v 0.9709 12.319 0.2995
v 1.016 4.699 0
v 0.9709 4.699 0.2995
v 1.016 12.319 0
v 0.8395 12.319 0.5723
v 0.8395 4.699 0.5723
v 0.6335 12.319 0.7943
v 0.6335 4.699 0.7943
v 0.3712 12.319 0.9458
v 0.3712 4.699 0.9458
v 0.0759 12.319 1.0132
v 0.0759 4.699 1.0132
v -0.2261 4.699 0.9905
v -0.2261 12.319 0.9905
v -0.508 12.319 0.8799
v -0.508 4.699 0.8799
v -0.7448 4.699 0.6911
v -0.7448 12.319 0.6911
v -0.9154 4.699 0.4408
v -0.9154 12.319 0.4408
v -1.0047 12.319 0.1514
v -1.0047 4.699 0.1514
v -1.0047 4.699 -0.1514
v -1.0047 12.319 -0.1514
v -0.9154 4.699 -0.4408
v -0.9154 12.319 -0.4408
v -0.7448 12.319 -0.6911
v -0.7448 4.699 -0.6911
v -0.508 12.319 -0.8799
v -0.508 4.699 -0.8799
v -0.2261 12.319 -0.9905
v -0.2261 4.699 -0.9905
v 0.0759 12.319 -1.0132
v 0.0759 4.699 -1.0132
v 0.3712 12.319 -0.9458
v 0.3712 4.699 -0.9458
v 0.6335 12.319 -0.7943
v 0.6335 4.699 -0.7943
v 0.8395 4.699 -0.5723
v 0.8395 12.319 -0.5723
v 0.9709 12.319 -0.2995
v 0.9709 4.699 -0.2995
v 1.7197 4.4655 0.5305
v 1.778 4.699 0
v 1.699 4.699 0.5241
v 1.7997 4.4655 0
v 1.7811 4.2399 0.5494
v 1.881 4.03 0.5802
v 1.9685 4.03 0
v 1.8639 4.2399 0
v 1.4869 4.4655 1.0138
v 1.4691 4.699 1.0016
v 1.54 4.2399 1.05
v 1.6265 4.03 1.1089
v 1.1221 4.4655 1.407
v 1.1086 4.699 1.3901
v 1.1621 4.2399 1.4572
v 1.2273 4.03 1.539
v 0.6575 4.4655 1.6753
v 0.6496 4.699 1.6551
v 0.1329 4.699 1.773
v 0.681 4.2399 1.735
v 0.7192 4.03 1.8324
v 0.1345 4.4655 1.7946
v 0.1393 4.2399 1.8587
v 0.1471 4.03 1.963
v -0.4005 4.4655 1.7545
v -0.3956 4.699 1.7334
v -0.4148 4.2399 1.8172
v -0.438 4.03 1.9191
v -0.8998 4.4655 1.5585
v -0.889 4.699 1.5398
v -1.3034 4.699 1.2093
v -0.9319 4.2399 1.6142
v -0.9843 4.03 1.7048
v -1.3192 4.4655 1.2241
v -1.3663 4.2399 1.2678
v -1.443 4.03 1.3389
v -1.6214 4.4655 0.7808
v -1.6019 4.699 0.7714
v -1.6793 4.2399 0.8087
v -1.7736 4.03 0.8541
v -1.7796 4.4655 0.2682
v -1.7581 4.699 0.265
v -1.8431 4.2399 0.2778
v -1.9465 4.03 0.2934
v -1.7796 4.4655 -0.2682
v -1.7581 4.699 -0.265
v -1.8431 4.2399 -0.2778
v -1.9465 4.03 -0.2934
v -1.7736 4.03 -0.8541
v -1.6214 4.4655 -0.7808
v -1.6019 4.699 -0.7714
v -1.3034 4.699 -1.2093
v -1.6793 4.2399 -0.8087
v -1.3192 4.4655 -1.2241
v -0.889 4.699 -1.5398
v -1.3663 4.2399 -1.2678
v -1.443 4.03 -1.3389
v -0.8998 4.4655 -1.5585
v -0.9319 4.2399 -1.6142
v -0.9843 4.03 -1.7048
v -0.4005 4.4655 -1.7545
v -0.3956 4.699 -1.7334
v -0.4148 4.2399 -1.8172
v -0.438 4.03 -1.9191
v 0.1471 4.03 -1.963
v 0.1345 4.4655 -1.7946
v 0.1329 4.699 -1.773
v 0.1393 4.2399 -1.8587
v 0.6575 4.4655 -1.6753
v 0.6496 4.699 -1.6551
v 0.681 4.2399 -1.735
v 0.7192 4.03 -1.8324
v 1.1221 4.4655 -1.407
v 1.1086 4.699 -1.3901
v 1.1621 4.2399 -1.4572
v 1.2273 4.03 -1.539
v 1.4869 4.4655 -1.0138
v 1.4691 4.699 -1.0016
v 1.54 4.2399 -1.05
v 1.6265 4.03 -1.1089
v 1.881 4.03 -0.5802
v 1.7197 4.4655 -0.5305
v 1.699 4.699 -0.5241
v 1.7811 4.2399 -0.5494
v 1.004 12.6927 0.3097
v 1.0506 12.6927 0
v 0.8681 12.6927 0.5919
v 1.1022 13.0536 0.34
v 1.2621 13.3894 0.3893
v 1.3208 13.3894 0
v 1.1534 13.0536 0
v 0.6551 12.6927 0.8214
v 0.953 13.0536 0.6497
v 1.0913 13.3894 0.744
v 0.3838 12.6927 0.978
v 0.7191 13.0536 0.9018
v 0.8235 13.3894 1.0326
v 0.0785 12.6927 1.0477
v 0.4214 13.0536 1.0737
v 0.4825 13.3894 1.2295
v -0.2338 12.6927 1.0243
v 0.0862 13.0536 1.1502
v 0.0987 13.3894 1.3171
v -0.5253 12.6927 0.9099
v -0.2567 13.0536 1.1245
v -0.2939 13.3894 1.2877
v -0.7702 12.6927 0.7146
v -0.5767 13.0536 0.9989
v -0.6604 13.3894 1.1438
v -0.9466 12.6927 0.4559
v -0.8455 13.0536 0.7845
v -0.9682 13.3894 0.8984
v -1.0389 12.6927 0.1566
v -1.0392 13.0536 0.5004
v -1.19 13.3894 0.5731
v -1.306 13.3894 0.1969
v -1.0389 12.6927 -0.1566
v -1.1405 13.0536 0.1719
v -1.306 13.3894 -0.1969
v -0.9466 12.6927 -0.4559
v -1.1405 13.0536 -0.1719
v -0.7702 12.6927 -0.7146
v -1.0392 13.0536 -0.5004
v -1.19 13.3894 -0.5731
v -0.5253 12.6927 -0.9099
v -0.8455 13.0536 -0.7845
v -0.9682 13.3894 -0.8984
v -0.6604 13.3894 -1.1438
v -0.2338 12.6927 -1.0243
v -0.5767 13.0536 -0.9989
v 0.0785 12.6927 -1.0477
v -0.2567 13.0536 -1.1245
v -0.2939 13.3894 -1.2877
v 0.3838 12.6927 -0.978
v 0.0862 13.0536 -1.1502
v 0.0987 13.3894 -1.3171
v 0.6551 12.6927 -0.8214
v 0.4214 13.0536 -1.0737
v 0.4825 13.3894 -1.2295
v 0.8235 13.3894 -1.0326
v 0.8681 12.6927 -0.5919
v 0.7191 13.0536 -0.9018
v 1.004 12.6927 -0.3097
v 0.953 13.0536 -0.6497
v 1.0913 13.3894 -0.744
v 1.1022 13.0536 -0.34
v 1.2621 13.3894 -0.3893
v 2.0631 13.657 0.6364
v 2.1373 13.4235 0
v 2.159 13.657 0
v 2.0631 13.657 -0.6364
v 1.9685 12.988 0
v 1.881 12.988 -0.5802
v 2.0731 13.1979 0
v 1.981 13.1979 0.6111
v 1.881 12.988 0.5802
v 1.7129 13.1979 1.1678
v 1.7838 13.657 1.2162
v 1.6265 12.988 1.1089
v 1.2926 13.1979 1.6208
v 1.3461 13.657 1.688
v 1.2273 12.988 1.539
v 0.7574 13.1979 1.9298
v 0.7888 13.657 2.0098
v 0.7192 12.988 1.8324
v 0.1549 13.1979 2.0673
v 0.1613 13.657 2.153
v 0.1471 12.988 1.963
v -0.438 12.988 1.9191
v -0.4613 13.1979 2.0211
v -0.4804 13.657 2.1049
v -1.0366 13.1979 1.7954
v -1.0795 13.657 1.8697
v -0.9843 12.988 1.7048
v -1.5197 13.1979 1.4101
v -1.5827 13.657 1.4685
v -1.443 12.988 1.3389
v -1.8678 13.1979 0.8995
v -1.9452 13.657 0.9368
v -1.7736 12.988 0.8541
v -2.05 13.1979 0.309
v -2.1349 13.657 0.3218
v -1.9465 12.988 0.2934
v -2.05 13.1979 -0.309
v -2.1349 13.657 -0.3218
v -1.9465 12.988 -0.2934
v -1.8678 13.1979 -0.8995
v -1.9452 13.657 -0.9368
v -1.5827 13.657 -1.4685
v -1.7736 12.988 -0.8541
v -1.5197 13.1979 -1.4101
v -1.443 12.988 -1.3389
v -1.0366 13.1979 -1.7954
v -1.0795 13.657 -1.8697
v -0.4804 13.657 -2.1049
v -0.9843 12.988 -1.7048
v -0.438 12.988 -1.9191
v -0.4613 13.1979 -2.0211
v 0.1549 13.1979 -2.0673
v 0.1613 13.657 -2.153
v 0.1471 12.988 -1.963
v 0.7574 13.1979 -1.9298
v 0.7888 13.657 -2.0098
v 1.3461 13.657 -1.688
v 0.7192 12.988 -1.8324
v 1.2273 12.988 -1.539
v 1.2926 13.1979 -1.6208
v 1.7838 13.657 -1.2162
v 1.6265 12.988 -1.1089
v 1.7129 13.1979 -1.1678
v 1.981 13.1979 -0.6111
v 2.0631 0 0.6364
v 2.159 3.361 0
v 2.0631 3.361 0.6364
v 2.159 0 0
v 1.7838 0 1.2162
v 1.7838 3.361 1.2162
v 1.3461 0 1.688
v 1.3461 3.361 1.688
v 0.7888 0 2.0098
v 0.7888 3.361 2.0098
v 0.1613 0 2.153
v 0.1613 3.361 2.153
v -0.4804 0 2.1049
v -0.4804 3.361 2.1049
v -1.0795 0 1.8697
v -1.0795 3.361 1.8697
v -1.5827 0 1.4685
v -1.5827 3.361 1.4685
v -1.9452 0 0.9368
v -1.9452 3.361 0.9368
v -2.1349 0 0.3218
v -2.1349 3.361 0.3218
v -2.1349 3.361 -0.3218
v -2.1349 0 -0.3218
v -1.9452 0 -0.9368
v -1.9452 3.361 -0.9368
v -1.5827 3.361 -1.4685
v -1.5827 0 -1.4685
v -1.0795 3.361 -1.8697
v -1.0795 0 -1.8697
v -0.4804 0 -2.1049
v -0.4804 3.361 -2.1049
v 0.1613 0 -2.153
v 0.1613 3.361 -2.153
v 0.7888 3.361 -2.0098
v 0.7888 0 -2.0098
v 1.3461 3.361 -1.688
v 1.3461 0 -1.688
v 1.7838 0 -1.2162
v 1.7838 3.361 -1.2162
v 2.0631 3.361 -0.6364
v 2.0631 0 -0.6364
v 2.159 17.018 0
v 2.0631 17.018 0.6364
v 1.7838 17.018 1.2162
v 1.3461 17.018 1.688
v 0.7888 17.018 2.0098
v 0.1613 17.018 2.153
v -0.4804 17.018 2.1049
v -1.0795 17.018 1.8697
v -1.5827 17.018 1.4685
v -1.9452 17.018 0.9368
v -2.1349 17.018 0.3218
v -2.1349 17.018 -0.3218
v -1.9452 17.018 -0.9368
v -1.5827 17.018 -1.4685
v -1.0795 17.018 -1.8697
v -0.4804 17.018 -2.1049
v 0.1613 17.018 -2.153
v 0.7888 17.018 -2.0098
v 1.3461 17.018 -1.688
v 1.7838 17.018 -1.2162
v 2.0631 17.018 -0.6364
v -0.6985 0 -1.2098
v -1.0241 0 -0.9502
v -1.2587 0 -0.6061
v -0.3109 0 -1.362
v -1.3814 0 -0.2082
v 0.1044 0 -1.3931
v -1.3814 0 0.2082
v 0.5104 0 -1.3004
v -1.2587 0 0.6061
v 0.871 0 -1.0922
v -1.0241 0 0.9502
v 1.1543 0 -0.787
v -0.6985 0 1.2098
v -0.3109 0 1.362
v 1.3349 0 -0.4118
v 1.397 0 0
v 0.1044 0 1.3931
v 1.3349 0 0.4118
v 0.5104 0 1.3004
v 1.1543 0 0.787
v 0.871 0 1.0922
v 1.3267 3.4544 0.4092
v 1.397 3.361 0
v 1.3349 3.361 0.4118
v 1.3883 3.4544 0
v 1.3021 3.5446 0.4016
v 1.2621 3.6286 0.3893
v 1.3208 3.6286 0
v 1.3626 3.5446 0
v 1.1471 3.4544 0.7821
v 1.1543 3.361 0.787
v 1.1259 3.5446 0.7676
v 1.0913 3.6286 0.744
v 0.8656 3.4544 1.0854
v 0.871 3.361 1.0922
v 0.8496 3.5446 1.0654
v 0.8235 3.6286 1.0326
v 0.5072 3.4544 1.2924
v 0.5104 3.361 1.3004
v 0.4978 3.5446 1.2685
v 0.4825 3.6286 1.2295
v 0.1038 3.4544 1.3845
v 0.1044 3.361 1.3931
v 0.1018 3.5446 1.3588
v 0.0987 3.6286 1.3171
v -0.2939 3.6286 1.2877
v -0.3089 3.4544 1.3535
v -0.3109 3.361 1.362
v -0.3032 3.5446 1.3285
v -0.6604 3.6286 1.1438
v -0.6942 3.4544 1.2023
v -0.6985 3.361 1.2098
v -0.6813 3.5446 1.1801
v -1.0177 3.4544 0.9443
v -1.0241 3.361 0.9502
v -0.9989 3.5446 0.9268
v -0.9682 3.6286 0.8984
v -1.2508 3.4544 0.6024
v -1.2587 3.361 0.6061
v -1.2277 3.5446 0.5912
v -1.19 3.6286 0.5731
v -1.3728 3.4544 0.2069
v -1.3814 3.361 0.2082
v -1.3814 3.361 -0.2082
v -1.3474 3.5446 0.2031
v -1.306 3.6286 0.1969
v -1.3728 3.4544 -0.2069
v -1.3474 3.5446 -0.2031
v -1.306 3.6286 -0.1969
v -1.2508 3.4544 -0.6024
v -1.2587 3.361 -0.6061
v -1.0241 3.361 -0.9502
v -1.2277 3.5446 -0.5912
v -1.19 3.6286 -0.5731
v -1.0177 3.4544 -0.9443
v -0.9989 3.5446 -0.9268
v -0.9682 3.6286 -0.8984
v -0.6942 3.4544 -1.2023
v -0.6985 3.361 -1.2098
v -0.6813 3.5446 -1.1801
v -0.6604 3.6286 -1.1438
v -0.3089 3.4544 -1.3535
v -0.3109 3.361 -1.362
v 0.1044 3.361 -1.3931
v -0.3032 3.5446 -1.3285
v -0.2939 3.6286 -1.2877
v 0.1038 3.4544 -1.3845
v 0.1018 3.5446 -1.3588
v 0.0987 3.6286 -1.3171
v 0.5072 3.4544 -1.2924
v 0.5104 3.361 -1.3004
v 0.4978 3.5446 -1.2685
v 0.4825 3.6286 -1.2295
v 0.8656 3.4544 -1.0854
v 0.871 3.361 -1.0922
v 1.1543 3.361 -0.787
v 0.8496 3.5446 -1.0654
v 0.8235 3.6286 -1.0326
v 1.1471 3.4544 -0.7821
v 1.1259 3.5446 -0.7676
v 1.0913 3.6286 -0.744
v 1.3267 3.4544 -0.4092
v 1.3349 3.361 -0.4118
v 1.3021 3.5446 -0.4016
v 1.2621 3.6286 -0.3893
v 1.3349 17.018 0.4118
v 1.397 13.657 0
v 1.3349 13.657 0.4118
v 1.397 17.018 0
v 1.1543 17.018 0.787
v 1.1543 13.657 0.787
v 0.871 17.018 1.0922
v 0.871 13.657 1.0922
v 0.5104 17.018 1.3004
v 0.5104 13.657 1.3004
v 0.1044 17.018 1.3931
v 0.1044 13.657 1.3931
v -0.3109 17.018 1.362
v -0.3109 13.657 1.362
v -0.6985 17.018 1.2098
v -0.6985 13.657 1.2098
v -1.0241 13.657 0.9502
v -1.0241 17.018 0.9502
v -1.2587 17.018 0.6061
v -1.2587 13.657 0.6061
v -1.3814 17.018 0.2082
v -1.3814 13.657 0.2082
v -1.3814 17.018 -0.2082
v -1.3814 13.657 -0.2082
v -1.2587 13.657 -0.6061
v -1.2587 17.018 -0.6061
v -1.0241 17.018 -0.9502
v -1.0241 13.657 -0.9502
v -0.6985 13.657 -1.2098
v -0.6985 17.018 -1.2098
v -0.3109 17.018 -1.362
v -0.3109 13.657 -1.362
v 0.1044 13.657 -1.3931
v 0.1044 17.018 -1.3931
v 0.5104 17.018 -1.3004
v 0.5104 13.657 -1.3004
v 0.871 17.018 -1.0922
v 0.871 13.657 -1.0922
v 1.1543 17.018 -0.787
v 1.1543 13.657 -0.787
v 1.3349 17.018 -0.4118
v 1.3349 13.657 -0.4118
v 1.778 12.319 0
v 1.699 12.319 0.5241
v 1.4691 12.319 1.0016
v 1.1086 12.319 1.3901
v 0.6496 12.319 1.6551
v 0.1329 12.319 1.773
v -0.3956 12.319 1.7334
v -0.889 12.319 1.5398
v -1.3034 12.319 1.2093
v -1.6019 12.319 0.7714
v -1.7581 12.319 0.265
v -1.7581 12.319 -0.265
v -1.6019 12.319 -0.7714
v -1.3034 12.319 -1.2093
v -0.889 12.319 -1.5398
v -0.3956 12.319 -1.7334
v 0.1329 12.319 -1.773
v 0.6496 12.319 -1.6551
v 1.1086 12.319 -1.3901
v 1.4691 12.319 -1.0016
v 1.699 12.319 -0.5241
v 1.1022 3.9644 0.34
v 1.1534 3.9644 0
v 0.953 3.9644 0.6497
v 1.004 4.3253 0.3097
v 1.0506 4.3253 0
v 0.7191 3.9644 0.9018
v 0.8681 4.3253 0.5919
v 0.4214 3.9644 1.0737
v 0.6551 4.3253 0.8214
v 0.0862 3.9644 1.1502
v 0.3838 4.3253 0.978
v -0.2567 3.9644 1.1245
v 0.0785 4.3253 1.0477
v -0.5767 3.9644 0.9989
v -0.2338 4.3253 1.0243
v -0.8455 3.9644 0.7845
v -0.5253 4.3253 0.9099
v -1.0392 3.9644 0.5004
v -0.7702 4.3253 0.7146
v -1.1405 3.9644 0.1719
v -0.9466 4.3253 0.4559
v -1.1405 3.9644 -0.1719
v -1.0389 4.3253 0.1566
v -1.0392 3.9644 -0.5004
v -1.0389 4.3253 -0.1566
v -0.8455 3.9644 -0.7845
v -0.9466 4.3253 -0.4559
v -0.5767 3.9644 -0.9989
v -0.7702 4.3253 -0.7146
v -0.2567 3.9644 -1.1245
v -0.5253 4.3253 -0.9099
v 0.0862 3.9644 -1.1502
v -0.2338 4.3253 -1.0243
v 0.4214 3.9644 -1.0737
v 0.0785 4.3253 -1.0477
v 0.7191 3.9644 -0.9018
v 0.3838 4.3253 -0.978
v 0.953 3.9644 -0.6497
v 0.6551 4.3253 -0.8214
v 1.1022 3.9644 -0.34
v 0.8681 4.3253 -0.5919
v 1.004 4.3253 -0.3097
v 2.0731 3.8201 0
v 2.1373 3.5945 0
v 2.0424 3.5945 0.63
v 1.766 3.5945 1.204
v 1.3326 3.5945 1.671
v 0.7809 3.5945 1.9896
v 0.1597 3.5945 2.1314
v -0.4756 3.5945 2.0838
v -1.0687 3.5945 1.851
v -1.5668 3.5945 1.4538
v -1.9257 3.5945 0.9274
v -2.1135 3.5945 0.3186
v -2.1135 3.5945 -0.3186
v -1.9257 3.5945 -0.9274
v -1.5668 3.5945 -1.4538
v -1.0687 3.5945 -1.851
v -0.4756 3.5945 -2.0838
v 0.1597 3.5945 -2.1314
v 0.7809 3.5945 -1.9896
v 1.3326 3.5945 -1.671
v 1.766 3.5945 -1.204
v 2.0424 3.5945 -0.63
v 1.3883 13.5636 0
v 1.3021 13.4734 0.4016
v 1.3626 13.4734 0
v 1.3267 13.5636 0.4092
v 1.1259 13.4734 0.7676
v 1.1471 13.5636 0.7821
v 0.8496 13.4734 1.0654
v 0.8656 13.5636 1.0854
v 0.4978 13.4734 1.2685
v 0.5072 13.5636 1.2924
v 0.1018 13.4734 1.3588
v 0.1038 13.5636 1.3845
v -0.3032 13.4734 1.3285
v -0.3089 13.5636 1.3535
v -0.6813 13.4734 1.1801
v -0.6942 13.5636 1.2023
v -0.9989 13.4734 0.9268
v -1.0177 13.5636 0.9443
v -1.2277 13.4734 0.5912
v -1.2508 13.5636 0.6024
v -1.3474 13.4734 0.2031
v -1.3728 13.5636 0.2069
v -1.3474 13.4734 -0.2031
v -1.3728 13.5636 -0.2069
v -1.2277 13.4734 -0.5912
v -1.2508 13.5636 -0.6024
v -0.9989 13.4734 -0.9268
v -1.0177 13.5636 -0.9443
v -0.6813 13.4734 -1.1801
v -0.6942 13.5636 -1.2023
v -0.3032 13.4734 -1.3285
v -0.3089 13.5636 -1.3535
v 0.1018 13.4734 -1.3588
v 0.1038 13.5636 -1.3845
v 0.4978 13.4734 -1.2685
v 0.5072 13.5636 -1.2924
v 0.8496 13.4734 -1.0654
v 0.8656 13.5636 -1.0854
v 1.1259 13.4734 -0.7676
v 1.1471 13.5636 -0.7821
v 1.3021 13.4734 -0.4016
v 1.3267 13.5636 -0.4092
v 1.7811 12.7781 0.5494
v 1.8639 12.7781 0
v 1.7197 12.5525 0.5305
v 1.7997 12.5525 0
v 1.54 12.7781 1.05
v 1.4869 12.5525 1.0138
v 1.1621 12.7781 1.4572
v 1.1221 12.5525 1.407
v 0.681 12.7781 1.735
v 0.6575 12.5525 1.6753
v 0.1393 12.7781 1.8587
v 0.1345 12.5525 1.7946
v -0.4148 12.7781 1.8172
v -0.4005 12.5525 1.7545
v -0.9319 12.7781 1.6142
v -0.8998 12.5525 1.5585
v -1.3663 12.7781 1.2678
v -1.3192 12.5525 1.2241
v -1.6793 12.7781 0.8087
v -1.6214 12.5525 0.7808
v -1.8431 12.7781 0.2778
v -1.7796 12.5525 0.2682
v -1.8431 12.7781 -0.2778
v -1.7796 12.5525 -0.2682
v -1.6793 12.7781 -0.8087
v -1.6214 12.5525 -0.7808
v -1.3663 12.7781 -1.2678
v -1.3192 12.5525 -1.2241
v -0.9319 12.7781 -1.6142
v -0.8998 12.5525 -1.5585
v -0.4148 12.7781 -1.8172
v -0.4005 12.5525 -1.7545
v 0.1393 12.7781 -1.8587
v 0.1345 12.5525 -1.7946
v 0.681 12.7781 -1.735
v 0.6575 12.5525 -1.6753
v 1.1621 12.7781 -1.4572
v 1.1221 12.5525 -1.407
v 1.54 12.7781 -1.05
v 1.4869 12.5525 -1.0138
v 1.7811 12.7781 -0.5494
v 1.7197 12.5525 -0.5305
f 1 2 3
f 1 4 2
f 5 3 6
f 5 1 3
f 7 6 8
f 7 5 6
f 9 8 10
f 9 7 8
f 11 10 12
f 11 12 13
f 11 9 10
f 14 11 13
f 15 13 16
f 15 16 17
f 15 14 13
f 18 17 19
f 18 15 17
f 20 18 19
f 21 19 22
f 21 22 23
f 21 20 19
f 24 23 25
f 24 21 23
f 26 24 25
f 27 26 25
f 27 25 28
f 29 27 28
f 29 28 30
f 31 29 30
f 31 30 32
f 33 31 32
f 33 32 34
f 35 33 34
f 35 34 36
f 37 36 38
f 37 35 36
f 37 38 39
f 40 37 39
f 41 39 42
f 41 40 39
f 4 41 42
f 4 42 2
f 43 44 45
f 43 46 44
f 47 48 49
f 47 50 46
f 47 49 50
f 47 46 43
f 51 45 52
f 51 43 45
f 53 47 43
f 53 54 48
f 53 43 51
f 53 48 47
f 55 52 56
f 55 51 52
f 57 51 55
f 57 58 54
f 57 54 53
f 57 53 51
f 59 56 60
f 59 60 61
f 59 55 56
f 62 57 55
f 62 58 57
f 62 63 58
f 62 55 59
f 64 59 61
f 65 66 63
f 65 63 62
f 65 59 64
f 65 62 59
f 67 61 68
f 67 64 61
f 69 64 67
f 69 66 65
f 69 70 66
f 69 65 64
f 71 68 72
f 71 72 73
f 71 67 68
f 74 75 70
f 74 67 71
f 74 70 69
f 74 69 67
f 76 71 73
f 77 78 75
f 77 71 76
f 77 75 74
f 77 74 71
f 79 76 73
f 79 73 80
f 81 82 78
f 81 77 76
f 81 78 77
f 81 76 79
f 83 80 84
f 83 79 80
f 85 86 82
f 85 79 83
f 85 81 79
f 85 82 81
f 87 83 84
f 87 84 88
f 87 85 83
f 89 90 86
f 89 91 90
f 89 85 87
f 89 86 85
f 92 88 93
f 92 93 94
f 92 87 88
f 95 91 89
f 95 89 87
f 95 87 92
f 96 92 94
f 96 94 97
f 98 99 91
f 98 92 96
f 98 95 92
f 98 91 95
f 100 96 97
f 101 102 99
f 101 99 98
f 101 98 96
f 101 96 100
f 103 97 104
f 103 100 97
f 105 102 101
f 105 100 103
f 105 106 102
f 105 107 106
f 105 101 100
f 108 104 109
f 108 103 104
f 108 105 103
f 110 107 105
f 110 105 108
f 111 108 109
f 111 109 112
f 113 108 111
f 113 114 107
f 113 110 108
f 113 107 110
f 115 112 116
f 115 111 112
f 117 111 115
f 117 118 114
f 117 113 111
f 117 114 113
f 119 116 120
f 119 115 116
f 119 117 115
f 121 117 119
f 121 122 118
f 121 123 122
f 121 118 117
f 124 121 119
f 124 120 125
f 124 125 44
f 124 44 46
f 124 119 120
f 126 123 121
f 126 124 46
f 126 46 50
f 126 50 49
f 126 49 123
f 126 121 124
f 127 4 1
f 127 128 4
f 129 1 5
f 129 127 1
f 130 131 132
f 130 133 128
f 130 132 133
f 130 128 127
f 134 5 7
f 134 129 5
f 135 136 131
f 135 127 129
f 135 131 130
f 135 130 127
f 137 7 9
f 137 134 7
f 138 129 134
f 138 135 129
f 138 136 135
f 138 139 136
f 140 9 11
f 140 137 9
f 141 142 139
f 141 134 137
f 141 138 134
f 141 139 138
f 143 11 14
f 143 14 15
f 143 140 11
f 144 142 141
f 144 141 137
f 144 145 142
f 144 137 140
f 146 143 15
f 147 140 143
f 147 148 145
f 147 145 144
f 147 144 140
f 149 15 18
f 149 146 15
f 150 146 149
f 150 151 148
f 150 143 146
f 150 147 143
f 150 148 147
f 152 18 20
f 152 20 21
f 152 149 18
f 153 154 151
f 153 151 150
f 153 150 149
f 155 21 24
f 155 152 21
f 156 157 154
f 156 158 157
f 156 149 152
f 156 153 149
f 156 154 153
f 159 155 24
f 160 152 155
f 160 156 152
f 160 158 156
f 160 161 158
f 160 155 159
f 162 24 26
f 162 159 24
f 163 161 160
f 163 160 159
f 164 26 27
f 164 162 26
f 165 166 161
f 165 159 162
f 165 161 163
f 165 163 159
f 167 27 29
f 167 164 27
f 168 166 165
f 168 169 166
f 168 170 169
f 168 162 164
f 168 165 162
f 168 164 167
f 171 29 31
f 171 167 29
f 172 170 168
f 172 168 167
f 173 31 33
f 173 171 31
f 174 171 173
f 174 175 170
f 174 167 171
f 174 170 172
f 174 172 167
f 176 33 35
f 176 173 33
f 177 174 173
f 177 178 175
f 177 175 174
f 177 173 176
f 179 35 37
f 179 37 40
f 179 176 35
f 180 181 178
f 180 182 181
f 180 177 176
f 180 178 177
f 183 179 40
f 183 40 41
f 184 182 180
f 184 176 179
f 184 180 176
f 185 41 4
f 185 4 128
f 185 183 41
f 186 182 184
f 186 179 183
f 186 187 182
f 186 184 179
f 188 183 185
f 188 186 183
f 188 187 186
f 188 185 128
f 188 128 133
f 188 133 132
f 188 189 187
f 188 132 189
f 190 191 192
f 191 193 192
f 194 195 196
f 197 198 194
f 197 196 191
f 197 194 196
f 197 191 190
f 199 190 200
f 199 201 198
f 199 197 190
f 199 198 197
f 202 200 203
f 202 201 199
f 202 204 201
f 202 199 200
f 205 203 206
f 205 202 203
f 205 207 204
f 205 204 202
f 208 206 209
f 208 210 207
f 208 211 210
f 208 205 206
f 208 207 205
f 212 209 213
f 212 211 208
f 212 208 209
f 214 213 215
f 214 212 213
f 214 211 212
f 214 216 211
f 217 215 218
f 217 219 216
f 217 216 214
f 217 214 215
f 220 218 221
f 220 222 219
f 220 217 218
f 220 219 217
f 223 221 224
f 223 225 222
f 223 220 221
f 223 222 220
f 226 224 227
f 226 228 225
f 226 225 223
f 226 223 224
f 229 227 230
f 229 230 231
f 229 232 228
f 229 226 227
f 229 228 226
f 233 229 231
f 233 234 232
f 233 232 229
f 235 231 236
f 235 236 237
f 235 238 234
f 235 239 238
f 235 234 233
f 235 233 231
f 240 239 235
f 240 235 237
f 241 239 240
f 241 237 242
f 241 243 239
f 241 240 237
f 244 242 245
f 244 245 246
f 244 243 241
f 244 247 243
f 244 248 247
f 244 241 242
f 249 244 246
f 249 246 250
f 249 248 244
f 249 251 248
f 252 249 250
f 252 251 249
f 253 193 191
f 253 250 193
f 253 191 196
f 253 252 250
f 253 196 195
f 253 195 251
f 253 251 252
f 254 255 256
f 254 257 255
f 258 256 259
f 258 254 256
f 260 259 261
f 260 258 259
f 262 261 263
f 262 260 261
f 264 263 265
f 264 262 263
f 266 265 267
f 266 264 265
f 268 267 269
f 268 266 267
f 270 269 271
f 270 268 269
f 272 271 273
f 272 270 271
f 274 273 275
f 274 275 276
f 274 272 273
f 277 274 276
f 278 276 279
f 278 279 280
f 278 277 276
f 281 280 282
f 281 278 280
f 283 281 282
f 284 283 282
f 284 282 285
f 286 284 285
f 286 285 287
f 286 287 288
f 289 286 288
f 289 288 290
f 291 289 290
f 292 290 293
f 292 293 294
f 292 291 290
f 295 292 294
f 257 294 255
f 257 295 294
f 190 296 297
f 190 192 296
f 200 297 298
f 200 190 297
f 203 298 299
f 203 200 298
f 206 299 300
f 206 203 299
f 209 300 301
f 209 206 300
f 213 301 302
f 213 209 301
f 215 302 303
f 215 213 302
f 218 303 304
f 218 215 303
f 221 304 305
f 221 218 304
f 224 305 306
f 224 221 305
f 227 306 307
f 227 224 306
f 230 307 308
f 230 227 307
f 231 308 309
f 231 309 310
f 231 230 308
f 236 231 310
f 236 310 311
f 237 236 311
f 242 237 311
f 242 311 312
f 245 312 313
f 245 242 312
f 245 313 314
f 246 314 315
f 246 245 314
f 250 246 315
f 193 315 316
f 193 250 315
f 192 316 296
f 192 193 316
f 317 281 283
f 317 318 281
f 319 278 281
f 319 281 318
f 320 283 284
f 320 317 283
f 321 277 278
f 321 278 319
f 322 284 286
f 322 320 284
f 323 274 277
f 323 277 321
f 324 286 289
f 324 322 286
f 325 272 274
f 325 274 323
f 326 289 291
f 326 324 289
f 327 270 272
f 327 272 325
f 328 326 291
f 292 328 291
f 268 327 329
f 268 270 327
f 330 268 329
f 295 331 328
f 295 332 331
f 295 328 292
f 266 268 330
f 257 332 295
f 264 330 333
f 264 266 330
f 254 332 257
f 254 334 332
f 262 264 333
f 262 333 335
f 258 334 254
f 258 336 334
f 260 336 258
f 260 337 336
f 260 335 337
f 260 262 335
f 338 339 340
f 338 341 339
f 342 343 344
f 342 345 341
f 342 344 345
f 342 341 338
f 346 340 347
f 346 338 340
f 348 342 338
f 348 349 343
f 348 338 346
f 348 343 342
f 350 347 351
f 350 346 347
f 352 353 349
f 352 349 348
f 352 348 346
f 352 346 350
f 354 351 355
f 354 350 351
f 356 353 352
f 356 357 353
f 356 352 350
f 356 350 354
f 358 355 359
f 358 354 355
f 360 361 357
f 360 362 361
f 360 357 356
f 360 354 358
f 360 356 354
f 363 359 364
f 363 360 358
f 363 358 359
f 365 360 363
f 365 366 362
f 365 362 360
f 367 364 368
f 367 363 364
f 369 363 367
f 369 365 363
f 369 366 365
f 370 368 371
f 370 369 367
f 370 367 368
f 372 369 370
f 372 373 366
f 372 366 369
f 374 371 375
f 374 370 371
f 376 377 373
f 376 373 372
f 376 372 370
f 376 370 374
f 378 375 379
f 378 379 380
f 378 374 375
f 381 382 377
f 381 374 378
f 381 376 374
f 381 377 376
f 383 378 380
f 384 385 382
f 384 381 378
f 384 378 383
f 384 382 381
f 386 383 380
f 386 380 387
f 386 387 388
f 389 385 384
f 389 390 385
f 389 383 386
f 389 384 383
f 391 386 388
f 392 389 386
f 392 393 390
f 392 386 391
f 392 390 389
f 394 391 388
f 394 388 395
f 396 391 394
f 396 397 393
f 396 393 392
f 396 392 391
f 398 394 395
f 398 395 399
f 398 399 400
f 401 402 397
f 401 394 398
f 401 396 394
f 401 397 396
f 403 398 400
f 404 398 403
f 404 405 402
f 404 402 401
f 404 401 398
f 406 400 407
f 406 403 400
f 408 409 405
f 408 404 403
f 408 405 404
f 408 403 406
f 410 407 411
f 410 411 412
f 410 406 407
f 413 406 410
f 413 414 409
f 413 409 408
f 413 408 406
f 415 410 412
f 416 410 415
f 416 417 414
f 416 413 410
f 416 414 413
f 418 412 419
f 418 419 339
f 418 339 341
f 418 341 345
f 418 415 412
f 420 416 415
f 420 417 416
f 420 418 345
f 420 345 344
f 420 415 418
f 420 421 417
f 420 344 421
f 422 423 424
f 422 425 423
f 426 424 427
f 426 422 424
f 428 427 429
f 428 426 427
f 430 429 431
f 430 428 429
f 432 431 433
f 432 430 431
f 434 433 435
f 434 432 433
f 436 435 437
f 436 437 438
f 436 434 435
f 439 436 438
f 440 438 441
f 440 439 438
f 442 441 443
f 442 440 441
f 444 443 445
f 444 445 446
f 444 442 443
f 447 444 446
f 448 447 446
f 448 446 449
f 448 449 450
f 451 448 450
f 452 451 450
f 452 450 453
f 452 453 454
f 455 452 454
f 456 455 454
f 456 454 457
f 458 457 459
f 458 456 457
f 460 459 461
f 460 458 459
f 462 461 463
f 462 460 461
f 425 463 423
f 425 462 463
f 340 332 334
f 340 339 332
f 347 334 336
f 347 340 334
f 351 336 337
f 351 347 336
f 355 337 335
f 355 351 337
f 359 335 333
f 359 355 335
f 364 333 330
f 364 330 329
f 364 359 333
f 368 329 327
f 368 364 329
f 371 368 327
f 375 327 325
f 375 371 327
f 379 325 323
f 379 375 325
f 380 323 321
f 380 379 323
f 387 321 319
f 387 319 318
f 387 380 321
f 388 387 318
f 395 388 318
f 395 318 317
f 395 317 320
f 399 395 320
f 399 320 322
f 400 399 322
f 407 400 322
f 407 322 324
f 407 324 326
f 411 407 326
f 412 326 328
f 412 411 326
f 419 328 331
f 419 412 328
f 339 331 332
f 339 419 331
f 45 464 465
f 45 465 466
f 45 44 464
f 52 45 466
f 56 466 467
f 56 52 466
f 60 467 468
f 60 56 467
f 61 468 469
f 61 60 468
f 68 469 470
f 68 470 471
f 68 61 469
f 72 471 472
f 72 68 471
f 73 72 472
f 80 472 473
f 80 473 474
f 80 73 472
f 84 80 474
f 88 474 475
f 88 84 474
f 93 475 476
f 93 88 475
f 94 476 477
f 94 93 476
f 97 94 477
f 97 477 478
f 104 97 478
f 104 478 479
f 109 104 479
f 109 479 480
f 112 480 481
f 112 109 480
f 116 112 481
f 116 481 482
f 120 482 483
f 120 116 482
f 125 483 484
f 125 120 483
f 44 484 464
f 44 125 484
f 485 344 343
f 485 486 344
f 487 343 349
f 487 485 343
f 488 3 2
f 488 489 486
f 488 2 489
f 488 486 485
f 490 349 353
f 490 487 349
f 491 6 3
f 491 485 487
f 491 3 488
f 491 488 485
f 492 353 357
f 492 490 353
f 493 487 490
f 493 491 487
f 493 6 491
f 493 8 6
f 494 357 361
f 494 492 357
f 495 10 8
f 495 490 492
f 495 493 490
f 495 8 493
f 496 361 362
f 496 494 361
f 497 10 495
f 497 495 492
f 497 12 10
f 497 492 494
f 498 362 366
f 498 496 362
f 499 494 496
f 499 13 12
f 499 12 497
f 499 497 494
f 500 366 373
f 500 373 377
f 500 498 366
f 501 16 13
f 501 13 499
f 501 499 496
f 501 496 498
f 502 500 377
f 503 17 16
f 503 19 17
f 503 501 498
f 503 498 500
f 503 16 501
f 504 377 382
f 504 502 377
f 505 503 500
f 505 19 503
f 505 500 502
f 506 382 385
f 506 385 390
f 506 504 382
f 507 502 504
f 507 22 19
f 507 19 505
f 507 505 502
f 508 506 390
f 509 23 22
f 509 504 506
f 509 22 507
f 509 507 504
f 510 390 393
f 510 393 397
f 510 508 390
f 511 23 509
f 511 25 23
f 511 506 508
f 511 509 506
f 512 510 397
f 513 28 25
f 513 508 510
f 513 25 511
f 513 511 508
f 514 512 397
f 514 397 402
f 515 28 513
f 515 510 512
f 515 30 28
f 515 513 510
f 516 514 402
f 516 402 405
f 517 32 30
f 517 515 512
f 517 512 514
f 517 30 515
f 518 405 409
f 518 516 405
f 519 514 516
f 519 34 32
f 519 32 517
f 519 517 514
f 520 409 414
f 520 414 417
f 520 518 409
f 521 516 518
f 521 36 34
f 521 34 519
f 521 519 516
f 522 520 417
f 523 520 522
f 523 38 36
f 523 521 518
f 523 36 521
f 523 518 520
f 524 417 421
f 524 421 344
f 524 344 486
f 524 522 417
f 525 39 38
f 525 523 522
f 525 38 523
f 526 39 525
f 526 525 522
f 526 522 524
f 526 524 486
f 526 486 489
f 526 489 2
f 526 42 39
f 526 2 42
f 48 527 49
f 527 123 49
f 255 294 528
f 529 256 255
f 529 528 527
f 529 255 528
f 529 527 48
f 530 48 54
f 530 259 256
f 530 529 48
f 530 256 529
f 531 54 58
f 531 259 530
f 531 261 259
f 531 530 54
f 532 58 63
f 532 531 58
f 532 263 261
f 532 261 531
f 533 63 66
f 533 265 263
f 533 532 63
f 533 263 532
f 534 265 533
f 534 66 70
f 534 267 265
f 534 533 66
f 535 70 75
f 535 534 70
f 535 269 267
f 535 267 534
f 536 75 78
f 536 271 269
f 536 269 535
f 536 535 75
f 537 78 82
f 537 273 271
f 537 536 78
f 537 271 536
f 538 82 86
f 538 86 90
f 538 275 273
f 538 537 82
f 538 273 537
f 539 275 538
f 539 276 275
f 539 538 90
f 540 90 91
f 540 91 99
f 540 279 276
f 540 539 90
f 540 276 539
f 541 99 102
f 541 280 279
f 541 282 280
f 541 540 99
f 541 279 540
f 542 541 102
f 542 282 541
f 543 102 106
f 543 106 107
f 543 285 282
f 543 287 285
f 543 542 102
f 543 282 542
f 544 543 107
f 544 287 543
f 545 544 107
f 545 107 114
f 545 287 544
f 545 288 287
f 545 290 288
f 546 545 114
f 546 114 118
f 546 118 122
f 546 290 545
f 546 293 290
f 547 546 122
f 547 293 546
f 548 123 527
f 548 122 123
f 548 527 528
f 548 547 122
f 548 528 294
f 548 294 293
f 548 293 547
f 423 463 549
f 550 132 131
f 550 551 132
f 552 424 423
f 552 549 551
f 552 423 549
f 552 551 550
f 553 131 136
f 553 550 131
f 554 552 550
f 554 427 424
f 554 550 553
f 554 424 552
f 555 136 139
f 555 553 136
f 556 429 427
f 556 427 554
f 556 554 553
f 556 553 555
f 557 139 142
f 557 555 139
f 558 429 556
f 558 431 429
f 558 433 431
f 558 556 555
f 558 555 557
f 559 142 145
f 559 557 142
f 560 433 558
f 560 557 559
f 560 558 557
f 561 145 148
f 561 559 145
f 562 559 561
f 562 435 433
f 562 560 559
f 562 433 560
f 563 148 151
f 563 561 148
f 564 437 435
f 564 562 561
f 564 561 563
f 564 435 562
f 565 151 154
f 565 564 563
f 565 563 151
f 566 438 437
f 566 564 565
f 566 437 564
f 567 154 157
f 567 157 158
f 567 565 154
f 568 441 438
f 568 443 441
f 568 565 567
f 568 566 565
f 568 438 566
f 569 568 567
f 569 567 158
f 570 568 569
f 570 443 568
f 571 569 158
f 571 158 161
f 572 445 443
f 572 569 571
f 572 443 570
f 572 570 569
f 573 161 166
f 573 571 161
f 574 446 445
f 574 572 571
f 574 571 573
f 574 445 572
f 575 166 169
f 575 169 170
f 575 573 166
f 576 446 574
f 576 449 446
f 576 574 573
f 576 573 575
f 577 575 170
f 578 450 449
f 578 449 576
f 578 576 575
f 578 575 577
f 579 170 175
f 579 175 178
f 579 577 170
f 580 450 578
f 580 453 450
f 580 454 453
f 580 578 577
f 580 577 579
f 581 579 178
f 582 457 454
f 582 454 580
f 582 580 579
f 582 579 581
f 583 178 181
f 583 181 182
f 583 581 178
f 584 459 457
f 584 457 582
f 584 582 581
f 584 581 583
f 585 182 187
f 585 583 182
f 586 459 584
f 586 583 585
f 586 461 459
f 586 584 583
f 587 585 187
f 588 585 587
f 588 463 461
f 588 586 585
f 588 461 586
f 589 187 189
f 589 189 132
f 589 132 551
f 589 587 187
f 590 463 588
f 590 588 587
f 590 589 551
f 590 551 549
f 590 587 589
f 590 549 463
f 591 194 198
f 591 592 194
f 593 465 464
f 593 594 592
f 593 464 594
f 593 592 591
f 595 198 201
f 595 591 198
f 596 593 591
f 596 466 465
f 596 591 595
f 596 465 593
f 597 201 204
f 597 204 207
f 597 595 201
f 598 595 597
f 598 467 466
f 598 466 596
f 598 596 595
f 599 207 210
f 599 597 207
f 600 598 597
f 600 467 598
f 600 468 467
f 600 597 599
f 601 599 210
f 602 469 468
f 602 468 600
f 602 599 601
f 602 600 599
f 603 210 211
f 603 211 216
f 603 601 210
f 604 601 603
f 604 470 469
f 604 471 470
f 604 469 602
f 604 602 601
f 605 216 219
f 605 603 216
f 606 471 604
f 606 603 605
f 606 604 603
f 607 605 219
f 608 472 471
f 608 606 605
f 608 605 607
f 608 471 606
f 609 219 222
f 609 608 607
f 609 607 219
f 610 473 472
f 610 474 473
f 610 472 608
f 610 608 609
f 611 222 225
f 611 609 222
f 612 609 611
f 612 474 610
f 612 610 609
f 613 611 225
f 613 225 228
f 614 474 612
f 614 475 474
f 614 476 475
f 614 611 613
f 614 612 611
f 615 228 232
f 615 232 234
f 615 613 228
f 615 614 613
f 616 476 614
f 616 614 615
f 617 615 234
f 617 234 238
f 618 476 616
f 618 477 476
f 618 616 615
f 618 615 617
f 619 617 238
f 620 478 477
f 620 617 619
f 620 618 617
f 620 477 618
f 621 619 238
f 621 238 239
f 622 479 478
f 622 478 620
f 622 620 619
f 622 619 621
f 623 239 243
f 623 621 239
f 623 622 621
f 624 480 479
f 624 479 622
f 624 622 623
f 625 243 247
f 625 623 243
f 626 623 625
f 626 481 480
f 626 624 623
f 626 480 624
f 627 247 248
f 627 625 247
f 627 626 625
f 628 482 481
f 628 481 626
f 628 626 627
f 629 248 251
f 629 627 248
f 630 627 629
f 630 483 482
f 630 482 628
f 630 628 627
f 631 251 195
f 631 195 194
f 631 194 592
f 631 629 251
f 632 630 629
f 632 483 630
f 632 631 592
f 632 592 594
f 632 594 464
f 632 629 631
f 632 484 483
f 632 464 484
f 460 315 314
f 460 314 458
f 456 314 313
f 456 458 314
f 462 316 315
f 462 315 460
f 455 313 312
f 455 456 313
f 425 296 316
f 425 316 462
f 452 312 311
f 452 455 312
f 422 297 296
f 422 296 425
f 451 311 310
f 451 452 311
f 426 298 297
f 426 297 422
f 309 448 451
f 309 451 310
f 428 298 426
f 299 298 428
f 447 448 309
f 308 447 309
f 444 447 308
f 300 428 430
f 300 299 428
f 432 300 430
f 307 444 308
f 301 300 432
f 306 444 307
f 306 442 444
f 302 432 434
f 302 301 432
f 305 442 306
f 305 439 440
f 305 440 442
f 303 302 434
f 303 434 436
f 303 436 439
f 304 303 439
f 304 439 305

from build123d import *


with BuildPart() as part:
    # Sketch1 → Revolve-Thin1 (revolve)
    with BuildSketch(Plane.XY):
        with BuildLine():
            Line((2.159, 17.018), (2.159, 13.657028027))
            ThreePointArc((2.159, 13.657028027), (2.110446888, 13.309224203), (1.9685, 12.988014013))
            ThreePointArc((1.9685, 12.988014013), (1.826553112, 12.666803824), (1.778, 12.319))
            Line((1.778, 12.319), (1.778, 4.699))
            ThreePointArc((1.778, 4.699), (1.826553112, 4.351196176), (1.9685, 4.029985987))
            ThreePointArc((1.9685, 4.029985987), (2.110446888, 3.708775797), (2.159, 3.360971973))
            Line((2.159, 3.360971973), (2.159, 0))
            Line((2.159, 0), (1.397, 0))
            Line((1.397, 0), (1.397, 3.360971973))
            ThreePointArc((1.397, 3.360971973), (1.377578755, 3.500093503), (1.3208, 3.628577579))
            ThreePointArc((1.3208, 3.628577579), (1.093684979, 4.142513882), (1.016, 4.699))
            Line((1.016, 4.699), (1.016, 12.319))
            ThreePointArc((1.016, 12.319), (1.093684979, 12.875486118), (1.3208, 13.389422421))
            ThreePointArc((1.3208, 13.389422421), (1.377578755, 13.517906497), (1.397, 13.657028027))
            Line((1.397, 13.657028027), (1.397, 17.018))
            Line((1.397, 17.018), (2.159, 17.018))
        make_face()
    revolve(axis=Axis((0, 17.018, 0), (0, -1, 0)))


solid = part.part
